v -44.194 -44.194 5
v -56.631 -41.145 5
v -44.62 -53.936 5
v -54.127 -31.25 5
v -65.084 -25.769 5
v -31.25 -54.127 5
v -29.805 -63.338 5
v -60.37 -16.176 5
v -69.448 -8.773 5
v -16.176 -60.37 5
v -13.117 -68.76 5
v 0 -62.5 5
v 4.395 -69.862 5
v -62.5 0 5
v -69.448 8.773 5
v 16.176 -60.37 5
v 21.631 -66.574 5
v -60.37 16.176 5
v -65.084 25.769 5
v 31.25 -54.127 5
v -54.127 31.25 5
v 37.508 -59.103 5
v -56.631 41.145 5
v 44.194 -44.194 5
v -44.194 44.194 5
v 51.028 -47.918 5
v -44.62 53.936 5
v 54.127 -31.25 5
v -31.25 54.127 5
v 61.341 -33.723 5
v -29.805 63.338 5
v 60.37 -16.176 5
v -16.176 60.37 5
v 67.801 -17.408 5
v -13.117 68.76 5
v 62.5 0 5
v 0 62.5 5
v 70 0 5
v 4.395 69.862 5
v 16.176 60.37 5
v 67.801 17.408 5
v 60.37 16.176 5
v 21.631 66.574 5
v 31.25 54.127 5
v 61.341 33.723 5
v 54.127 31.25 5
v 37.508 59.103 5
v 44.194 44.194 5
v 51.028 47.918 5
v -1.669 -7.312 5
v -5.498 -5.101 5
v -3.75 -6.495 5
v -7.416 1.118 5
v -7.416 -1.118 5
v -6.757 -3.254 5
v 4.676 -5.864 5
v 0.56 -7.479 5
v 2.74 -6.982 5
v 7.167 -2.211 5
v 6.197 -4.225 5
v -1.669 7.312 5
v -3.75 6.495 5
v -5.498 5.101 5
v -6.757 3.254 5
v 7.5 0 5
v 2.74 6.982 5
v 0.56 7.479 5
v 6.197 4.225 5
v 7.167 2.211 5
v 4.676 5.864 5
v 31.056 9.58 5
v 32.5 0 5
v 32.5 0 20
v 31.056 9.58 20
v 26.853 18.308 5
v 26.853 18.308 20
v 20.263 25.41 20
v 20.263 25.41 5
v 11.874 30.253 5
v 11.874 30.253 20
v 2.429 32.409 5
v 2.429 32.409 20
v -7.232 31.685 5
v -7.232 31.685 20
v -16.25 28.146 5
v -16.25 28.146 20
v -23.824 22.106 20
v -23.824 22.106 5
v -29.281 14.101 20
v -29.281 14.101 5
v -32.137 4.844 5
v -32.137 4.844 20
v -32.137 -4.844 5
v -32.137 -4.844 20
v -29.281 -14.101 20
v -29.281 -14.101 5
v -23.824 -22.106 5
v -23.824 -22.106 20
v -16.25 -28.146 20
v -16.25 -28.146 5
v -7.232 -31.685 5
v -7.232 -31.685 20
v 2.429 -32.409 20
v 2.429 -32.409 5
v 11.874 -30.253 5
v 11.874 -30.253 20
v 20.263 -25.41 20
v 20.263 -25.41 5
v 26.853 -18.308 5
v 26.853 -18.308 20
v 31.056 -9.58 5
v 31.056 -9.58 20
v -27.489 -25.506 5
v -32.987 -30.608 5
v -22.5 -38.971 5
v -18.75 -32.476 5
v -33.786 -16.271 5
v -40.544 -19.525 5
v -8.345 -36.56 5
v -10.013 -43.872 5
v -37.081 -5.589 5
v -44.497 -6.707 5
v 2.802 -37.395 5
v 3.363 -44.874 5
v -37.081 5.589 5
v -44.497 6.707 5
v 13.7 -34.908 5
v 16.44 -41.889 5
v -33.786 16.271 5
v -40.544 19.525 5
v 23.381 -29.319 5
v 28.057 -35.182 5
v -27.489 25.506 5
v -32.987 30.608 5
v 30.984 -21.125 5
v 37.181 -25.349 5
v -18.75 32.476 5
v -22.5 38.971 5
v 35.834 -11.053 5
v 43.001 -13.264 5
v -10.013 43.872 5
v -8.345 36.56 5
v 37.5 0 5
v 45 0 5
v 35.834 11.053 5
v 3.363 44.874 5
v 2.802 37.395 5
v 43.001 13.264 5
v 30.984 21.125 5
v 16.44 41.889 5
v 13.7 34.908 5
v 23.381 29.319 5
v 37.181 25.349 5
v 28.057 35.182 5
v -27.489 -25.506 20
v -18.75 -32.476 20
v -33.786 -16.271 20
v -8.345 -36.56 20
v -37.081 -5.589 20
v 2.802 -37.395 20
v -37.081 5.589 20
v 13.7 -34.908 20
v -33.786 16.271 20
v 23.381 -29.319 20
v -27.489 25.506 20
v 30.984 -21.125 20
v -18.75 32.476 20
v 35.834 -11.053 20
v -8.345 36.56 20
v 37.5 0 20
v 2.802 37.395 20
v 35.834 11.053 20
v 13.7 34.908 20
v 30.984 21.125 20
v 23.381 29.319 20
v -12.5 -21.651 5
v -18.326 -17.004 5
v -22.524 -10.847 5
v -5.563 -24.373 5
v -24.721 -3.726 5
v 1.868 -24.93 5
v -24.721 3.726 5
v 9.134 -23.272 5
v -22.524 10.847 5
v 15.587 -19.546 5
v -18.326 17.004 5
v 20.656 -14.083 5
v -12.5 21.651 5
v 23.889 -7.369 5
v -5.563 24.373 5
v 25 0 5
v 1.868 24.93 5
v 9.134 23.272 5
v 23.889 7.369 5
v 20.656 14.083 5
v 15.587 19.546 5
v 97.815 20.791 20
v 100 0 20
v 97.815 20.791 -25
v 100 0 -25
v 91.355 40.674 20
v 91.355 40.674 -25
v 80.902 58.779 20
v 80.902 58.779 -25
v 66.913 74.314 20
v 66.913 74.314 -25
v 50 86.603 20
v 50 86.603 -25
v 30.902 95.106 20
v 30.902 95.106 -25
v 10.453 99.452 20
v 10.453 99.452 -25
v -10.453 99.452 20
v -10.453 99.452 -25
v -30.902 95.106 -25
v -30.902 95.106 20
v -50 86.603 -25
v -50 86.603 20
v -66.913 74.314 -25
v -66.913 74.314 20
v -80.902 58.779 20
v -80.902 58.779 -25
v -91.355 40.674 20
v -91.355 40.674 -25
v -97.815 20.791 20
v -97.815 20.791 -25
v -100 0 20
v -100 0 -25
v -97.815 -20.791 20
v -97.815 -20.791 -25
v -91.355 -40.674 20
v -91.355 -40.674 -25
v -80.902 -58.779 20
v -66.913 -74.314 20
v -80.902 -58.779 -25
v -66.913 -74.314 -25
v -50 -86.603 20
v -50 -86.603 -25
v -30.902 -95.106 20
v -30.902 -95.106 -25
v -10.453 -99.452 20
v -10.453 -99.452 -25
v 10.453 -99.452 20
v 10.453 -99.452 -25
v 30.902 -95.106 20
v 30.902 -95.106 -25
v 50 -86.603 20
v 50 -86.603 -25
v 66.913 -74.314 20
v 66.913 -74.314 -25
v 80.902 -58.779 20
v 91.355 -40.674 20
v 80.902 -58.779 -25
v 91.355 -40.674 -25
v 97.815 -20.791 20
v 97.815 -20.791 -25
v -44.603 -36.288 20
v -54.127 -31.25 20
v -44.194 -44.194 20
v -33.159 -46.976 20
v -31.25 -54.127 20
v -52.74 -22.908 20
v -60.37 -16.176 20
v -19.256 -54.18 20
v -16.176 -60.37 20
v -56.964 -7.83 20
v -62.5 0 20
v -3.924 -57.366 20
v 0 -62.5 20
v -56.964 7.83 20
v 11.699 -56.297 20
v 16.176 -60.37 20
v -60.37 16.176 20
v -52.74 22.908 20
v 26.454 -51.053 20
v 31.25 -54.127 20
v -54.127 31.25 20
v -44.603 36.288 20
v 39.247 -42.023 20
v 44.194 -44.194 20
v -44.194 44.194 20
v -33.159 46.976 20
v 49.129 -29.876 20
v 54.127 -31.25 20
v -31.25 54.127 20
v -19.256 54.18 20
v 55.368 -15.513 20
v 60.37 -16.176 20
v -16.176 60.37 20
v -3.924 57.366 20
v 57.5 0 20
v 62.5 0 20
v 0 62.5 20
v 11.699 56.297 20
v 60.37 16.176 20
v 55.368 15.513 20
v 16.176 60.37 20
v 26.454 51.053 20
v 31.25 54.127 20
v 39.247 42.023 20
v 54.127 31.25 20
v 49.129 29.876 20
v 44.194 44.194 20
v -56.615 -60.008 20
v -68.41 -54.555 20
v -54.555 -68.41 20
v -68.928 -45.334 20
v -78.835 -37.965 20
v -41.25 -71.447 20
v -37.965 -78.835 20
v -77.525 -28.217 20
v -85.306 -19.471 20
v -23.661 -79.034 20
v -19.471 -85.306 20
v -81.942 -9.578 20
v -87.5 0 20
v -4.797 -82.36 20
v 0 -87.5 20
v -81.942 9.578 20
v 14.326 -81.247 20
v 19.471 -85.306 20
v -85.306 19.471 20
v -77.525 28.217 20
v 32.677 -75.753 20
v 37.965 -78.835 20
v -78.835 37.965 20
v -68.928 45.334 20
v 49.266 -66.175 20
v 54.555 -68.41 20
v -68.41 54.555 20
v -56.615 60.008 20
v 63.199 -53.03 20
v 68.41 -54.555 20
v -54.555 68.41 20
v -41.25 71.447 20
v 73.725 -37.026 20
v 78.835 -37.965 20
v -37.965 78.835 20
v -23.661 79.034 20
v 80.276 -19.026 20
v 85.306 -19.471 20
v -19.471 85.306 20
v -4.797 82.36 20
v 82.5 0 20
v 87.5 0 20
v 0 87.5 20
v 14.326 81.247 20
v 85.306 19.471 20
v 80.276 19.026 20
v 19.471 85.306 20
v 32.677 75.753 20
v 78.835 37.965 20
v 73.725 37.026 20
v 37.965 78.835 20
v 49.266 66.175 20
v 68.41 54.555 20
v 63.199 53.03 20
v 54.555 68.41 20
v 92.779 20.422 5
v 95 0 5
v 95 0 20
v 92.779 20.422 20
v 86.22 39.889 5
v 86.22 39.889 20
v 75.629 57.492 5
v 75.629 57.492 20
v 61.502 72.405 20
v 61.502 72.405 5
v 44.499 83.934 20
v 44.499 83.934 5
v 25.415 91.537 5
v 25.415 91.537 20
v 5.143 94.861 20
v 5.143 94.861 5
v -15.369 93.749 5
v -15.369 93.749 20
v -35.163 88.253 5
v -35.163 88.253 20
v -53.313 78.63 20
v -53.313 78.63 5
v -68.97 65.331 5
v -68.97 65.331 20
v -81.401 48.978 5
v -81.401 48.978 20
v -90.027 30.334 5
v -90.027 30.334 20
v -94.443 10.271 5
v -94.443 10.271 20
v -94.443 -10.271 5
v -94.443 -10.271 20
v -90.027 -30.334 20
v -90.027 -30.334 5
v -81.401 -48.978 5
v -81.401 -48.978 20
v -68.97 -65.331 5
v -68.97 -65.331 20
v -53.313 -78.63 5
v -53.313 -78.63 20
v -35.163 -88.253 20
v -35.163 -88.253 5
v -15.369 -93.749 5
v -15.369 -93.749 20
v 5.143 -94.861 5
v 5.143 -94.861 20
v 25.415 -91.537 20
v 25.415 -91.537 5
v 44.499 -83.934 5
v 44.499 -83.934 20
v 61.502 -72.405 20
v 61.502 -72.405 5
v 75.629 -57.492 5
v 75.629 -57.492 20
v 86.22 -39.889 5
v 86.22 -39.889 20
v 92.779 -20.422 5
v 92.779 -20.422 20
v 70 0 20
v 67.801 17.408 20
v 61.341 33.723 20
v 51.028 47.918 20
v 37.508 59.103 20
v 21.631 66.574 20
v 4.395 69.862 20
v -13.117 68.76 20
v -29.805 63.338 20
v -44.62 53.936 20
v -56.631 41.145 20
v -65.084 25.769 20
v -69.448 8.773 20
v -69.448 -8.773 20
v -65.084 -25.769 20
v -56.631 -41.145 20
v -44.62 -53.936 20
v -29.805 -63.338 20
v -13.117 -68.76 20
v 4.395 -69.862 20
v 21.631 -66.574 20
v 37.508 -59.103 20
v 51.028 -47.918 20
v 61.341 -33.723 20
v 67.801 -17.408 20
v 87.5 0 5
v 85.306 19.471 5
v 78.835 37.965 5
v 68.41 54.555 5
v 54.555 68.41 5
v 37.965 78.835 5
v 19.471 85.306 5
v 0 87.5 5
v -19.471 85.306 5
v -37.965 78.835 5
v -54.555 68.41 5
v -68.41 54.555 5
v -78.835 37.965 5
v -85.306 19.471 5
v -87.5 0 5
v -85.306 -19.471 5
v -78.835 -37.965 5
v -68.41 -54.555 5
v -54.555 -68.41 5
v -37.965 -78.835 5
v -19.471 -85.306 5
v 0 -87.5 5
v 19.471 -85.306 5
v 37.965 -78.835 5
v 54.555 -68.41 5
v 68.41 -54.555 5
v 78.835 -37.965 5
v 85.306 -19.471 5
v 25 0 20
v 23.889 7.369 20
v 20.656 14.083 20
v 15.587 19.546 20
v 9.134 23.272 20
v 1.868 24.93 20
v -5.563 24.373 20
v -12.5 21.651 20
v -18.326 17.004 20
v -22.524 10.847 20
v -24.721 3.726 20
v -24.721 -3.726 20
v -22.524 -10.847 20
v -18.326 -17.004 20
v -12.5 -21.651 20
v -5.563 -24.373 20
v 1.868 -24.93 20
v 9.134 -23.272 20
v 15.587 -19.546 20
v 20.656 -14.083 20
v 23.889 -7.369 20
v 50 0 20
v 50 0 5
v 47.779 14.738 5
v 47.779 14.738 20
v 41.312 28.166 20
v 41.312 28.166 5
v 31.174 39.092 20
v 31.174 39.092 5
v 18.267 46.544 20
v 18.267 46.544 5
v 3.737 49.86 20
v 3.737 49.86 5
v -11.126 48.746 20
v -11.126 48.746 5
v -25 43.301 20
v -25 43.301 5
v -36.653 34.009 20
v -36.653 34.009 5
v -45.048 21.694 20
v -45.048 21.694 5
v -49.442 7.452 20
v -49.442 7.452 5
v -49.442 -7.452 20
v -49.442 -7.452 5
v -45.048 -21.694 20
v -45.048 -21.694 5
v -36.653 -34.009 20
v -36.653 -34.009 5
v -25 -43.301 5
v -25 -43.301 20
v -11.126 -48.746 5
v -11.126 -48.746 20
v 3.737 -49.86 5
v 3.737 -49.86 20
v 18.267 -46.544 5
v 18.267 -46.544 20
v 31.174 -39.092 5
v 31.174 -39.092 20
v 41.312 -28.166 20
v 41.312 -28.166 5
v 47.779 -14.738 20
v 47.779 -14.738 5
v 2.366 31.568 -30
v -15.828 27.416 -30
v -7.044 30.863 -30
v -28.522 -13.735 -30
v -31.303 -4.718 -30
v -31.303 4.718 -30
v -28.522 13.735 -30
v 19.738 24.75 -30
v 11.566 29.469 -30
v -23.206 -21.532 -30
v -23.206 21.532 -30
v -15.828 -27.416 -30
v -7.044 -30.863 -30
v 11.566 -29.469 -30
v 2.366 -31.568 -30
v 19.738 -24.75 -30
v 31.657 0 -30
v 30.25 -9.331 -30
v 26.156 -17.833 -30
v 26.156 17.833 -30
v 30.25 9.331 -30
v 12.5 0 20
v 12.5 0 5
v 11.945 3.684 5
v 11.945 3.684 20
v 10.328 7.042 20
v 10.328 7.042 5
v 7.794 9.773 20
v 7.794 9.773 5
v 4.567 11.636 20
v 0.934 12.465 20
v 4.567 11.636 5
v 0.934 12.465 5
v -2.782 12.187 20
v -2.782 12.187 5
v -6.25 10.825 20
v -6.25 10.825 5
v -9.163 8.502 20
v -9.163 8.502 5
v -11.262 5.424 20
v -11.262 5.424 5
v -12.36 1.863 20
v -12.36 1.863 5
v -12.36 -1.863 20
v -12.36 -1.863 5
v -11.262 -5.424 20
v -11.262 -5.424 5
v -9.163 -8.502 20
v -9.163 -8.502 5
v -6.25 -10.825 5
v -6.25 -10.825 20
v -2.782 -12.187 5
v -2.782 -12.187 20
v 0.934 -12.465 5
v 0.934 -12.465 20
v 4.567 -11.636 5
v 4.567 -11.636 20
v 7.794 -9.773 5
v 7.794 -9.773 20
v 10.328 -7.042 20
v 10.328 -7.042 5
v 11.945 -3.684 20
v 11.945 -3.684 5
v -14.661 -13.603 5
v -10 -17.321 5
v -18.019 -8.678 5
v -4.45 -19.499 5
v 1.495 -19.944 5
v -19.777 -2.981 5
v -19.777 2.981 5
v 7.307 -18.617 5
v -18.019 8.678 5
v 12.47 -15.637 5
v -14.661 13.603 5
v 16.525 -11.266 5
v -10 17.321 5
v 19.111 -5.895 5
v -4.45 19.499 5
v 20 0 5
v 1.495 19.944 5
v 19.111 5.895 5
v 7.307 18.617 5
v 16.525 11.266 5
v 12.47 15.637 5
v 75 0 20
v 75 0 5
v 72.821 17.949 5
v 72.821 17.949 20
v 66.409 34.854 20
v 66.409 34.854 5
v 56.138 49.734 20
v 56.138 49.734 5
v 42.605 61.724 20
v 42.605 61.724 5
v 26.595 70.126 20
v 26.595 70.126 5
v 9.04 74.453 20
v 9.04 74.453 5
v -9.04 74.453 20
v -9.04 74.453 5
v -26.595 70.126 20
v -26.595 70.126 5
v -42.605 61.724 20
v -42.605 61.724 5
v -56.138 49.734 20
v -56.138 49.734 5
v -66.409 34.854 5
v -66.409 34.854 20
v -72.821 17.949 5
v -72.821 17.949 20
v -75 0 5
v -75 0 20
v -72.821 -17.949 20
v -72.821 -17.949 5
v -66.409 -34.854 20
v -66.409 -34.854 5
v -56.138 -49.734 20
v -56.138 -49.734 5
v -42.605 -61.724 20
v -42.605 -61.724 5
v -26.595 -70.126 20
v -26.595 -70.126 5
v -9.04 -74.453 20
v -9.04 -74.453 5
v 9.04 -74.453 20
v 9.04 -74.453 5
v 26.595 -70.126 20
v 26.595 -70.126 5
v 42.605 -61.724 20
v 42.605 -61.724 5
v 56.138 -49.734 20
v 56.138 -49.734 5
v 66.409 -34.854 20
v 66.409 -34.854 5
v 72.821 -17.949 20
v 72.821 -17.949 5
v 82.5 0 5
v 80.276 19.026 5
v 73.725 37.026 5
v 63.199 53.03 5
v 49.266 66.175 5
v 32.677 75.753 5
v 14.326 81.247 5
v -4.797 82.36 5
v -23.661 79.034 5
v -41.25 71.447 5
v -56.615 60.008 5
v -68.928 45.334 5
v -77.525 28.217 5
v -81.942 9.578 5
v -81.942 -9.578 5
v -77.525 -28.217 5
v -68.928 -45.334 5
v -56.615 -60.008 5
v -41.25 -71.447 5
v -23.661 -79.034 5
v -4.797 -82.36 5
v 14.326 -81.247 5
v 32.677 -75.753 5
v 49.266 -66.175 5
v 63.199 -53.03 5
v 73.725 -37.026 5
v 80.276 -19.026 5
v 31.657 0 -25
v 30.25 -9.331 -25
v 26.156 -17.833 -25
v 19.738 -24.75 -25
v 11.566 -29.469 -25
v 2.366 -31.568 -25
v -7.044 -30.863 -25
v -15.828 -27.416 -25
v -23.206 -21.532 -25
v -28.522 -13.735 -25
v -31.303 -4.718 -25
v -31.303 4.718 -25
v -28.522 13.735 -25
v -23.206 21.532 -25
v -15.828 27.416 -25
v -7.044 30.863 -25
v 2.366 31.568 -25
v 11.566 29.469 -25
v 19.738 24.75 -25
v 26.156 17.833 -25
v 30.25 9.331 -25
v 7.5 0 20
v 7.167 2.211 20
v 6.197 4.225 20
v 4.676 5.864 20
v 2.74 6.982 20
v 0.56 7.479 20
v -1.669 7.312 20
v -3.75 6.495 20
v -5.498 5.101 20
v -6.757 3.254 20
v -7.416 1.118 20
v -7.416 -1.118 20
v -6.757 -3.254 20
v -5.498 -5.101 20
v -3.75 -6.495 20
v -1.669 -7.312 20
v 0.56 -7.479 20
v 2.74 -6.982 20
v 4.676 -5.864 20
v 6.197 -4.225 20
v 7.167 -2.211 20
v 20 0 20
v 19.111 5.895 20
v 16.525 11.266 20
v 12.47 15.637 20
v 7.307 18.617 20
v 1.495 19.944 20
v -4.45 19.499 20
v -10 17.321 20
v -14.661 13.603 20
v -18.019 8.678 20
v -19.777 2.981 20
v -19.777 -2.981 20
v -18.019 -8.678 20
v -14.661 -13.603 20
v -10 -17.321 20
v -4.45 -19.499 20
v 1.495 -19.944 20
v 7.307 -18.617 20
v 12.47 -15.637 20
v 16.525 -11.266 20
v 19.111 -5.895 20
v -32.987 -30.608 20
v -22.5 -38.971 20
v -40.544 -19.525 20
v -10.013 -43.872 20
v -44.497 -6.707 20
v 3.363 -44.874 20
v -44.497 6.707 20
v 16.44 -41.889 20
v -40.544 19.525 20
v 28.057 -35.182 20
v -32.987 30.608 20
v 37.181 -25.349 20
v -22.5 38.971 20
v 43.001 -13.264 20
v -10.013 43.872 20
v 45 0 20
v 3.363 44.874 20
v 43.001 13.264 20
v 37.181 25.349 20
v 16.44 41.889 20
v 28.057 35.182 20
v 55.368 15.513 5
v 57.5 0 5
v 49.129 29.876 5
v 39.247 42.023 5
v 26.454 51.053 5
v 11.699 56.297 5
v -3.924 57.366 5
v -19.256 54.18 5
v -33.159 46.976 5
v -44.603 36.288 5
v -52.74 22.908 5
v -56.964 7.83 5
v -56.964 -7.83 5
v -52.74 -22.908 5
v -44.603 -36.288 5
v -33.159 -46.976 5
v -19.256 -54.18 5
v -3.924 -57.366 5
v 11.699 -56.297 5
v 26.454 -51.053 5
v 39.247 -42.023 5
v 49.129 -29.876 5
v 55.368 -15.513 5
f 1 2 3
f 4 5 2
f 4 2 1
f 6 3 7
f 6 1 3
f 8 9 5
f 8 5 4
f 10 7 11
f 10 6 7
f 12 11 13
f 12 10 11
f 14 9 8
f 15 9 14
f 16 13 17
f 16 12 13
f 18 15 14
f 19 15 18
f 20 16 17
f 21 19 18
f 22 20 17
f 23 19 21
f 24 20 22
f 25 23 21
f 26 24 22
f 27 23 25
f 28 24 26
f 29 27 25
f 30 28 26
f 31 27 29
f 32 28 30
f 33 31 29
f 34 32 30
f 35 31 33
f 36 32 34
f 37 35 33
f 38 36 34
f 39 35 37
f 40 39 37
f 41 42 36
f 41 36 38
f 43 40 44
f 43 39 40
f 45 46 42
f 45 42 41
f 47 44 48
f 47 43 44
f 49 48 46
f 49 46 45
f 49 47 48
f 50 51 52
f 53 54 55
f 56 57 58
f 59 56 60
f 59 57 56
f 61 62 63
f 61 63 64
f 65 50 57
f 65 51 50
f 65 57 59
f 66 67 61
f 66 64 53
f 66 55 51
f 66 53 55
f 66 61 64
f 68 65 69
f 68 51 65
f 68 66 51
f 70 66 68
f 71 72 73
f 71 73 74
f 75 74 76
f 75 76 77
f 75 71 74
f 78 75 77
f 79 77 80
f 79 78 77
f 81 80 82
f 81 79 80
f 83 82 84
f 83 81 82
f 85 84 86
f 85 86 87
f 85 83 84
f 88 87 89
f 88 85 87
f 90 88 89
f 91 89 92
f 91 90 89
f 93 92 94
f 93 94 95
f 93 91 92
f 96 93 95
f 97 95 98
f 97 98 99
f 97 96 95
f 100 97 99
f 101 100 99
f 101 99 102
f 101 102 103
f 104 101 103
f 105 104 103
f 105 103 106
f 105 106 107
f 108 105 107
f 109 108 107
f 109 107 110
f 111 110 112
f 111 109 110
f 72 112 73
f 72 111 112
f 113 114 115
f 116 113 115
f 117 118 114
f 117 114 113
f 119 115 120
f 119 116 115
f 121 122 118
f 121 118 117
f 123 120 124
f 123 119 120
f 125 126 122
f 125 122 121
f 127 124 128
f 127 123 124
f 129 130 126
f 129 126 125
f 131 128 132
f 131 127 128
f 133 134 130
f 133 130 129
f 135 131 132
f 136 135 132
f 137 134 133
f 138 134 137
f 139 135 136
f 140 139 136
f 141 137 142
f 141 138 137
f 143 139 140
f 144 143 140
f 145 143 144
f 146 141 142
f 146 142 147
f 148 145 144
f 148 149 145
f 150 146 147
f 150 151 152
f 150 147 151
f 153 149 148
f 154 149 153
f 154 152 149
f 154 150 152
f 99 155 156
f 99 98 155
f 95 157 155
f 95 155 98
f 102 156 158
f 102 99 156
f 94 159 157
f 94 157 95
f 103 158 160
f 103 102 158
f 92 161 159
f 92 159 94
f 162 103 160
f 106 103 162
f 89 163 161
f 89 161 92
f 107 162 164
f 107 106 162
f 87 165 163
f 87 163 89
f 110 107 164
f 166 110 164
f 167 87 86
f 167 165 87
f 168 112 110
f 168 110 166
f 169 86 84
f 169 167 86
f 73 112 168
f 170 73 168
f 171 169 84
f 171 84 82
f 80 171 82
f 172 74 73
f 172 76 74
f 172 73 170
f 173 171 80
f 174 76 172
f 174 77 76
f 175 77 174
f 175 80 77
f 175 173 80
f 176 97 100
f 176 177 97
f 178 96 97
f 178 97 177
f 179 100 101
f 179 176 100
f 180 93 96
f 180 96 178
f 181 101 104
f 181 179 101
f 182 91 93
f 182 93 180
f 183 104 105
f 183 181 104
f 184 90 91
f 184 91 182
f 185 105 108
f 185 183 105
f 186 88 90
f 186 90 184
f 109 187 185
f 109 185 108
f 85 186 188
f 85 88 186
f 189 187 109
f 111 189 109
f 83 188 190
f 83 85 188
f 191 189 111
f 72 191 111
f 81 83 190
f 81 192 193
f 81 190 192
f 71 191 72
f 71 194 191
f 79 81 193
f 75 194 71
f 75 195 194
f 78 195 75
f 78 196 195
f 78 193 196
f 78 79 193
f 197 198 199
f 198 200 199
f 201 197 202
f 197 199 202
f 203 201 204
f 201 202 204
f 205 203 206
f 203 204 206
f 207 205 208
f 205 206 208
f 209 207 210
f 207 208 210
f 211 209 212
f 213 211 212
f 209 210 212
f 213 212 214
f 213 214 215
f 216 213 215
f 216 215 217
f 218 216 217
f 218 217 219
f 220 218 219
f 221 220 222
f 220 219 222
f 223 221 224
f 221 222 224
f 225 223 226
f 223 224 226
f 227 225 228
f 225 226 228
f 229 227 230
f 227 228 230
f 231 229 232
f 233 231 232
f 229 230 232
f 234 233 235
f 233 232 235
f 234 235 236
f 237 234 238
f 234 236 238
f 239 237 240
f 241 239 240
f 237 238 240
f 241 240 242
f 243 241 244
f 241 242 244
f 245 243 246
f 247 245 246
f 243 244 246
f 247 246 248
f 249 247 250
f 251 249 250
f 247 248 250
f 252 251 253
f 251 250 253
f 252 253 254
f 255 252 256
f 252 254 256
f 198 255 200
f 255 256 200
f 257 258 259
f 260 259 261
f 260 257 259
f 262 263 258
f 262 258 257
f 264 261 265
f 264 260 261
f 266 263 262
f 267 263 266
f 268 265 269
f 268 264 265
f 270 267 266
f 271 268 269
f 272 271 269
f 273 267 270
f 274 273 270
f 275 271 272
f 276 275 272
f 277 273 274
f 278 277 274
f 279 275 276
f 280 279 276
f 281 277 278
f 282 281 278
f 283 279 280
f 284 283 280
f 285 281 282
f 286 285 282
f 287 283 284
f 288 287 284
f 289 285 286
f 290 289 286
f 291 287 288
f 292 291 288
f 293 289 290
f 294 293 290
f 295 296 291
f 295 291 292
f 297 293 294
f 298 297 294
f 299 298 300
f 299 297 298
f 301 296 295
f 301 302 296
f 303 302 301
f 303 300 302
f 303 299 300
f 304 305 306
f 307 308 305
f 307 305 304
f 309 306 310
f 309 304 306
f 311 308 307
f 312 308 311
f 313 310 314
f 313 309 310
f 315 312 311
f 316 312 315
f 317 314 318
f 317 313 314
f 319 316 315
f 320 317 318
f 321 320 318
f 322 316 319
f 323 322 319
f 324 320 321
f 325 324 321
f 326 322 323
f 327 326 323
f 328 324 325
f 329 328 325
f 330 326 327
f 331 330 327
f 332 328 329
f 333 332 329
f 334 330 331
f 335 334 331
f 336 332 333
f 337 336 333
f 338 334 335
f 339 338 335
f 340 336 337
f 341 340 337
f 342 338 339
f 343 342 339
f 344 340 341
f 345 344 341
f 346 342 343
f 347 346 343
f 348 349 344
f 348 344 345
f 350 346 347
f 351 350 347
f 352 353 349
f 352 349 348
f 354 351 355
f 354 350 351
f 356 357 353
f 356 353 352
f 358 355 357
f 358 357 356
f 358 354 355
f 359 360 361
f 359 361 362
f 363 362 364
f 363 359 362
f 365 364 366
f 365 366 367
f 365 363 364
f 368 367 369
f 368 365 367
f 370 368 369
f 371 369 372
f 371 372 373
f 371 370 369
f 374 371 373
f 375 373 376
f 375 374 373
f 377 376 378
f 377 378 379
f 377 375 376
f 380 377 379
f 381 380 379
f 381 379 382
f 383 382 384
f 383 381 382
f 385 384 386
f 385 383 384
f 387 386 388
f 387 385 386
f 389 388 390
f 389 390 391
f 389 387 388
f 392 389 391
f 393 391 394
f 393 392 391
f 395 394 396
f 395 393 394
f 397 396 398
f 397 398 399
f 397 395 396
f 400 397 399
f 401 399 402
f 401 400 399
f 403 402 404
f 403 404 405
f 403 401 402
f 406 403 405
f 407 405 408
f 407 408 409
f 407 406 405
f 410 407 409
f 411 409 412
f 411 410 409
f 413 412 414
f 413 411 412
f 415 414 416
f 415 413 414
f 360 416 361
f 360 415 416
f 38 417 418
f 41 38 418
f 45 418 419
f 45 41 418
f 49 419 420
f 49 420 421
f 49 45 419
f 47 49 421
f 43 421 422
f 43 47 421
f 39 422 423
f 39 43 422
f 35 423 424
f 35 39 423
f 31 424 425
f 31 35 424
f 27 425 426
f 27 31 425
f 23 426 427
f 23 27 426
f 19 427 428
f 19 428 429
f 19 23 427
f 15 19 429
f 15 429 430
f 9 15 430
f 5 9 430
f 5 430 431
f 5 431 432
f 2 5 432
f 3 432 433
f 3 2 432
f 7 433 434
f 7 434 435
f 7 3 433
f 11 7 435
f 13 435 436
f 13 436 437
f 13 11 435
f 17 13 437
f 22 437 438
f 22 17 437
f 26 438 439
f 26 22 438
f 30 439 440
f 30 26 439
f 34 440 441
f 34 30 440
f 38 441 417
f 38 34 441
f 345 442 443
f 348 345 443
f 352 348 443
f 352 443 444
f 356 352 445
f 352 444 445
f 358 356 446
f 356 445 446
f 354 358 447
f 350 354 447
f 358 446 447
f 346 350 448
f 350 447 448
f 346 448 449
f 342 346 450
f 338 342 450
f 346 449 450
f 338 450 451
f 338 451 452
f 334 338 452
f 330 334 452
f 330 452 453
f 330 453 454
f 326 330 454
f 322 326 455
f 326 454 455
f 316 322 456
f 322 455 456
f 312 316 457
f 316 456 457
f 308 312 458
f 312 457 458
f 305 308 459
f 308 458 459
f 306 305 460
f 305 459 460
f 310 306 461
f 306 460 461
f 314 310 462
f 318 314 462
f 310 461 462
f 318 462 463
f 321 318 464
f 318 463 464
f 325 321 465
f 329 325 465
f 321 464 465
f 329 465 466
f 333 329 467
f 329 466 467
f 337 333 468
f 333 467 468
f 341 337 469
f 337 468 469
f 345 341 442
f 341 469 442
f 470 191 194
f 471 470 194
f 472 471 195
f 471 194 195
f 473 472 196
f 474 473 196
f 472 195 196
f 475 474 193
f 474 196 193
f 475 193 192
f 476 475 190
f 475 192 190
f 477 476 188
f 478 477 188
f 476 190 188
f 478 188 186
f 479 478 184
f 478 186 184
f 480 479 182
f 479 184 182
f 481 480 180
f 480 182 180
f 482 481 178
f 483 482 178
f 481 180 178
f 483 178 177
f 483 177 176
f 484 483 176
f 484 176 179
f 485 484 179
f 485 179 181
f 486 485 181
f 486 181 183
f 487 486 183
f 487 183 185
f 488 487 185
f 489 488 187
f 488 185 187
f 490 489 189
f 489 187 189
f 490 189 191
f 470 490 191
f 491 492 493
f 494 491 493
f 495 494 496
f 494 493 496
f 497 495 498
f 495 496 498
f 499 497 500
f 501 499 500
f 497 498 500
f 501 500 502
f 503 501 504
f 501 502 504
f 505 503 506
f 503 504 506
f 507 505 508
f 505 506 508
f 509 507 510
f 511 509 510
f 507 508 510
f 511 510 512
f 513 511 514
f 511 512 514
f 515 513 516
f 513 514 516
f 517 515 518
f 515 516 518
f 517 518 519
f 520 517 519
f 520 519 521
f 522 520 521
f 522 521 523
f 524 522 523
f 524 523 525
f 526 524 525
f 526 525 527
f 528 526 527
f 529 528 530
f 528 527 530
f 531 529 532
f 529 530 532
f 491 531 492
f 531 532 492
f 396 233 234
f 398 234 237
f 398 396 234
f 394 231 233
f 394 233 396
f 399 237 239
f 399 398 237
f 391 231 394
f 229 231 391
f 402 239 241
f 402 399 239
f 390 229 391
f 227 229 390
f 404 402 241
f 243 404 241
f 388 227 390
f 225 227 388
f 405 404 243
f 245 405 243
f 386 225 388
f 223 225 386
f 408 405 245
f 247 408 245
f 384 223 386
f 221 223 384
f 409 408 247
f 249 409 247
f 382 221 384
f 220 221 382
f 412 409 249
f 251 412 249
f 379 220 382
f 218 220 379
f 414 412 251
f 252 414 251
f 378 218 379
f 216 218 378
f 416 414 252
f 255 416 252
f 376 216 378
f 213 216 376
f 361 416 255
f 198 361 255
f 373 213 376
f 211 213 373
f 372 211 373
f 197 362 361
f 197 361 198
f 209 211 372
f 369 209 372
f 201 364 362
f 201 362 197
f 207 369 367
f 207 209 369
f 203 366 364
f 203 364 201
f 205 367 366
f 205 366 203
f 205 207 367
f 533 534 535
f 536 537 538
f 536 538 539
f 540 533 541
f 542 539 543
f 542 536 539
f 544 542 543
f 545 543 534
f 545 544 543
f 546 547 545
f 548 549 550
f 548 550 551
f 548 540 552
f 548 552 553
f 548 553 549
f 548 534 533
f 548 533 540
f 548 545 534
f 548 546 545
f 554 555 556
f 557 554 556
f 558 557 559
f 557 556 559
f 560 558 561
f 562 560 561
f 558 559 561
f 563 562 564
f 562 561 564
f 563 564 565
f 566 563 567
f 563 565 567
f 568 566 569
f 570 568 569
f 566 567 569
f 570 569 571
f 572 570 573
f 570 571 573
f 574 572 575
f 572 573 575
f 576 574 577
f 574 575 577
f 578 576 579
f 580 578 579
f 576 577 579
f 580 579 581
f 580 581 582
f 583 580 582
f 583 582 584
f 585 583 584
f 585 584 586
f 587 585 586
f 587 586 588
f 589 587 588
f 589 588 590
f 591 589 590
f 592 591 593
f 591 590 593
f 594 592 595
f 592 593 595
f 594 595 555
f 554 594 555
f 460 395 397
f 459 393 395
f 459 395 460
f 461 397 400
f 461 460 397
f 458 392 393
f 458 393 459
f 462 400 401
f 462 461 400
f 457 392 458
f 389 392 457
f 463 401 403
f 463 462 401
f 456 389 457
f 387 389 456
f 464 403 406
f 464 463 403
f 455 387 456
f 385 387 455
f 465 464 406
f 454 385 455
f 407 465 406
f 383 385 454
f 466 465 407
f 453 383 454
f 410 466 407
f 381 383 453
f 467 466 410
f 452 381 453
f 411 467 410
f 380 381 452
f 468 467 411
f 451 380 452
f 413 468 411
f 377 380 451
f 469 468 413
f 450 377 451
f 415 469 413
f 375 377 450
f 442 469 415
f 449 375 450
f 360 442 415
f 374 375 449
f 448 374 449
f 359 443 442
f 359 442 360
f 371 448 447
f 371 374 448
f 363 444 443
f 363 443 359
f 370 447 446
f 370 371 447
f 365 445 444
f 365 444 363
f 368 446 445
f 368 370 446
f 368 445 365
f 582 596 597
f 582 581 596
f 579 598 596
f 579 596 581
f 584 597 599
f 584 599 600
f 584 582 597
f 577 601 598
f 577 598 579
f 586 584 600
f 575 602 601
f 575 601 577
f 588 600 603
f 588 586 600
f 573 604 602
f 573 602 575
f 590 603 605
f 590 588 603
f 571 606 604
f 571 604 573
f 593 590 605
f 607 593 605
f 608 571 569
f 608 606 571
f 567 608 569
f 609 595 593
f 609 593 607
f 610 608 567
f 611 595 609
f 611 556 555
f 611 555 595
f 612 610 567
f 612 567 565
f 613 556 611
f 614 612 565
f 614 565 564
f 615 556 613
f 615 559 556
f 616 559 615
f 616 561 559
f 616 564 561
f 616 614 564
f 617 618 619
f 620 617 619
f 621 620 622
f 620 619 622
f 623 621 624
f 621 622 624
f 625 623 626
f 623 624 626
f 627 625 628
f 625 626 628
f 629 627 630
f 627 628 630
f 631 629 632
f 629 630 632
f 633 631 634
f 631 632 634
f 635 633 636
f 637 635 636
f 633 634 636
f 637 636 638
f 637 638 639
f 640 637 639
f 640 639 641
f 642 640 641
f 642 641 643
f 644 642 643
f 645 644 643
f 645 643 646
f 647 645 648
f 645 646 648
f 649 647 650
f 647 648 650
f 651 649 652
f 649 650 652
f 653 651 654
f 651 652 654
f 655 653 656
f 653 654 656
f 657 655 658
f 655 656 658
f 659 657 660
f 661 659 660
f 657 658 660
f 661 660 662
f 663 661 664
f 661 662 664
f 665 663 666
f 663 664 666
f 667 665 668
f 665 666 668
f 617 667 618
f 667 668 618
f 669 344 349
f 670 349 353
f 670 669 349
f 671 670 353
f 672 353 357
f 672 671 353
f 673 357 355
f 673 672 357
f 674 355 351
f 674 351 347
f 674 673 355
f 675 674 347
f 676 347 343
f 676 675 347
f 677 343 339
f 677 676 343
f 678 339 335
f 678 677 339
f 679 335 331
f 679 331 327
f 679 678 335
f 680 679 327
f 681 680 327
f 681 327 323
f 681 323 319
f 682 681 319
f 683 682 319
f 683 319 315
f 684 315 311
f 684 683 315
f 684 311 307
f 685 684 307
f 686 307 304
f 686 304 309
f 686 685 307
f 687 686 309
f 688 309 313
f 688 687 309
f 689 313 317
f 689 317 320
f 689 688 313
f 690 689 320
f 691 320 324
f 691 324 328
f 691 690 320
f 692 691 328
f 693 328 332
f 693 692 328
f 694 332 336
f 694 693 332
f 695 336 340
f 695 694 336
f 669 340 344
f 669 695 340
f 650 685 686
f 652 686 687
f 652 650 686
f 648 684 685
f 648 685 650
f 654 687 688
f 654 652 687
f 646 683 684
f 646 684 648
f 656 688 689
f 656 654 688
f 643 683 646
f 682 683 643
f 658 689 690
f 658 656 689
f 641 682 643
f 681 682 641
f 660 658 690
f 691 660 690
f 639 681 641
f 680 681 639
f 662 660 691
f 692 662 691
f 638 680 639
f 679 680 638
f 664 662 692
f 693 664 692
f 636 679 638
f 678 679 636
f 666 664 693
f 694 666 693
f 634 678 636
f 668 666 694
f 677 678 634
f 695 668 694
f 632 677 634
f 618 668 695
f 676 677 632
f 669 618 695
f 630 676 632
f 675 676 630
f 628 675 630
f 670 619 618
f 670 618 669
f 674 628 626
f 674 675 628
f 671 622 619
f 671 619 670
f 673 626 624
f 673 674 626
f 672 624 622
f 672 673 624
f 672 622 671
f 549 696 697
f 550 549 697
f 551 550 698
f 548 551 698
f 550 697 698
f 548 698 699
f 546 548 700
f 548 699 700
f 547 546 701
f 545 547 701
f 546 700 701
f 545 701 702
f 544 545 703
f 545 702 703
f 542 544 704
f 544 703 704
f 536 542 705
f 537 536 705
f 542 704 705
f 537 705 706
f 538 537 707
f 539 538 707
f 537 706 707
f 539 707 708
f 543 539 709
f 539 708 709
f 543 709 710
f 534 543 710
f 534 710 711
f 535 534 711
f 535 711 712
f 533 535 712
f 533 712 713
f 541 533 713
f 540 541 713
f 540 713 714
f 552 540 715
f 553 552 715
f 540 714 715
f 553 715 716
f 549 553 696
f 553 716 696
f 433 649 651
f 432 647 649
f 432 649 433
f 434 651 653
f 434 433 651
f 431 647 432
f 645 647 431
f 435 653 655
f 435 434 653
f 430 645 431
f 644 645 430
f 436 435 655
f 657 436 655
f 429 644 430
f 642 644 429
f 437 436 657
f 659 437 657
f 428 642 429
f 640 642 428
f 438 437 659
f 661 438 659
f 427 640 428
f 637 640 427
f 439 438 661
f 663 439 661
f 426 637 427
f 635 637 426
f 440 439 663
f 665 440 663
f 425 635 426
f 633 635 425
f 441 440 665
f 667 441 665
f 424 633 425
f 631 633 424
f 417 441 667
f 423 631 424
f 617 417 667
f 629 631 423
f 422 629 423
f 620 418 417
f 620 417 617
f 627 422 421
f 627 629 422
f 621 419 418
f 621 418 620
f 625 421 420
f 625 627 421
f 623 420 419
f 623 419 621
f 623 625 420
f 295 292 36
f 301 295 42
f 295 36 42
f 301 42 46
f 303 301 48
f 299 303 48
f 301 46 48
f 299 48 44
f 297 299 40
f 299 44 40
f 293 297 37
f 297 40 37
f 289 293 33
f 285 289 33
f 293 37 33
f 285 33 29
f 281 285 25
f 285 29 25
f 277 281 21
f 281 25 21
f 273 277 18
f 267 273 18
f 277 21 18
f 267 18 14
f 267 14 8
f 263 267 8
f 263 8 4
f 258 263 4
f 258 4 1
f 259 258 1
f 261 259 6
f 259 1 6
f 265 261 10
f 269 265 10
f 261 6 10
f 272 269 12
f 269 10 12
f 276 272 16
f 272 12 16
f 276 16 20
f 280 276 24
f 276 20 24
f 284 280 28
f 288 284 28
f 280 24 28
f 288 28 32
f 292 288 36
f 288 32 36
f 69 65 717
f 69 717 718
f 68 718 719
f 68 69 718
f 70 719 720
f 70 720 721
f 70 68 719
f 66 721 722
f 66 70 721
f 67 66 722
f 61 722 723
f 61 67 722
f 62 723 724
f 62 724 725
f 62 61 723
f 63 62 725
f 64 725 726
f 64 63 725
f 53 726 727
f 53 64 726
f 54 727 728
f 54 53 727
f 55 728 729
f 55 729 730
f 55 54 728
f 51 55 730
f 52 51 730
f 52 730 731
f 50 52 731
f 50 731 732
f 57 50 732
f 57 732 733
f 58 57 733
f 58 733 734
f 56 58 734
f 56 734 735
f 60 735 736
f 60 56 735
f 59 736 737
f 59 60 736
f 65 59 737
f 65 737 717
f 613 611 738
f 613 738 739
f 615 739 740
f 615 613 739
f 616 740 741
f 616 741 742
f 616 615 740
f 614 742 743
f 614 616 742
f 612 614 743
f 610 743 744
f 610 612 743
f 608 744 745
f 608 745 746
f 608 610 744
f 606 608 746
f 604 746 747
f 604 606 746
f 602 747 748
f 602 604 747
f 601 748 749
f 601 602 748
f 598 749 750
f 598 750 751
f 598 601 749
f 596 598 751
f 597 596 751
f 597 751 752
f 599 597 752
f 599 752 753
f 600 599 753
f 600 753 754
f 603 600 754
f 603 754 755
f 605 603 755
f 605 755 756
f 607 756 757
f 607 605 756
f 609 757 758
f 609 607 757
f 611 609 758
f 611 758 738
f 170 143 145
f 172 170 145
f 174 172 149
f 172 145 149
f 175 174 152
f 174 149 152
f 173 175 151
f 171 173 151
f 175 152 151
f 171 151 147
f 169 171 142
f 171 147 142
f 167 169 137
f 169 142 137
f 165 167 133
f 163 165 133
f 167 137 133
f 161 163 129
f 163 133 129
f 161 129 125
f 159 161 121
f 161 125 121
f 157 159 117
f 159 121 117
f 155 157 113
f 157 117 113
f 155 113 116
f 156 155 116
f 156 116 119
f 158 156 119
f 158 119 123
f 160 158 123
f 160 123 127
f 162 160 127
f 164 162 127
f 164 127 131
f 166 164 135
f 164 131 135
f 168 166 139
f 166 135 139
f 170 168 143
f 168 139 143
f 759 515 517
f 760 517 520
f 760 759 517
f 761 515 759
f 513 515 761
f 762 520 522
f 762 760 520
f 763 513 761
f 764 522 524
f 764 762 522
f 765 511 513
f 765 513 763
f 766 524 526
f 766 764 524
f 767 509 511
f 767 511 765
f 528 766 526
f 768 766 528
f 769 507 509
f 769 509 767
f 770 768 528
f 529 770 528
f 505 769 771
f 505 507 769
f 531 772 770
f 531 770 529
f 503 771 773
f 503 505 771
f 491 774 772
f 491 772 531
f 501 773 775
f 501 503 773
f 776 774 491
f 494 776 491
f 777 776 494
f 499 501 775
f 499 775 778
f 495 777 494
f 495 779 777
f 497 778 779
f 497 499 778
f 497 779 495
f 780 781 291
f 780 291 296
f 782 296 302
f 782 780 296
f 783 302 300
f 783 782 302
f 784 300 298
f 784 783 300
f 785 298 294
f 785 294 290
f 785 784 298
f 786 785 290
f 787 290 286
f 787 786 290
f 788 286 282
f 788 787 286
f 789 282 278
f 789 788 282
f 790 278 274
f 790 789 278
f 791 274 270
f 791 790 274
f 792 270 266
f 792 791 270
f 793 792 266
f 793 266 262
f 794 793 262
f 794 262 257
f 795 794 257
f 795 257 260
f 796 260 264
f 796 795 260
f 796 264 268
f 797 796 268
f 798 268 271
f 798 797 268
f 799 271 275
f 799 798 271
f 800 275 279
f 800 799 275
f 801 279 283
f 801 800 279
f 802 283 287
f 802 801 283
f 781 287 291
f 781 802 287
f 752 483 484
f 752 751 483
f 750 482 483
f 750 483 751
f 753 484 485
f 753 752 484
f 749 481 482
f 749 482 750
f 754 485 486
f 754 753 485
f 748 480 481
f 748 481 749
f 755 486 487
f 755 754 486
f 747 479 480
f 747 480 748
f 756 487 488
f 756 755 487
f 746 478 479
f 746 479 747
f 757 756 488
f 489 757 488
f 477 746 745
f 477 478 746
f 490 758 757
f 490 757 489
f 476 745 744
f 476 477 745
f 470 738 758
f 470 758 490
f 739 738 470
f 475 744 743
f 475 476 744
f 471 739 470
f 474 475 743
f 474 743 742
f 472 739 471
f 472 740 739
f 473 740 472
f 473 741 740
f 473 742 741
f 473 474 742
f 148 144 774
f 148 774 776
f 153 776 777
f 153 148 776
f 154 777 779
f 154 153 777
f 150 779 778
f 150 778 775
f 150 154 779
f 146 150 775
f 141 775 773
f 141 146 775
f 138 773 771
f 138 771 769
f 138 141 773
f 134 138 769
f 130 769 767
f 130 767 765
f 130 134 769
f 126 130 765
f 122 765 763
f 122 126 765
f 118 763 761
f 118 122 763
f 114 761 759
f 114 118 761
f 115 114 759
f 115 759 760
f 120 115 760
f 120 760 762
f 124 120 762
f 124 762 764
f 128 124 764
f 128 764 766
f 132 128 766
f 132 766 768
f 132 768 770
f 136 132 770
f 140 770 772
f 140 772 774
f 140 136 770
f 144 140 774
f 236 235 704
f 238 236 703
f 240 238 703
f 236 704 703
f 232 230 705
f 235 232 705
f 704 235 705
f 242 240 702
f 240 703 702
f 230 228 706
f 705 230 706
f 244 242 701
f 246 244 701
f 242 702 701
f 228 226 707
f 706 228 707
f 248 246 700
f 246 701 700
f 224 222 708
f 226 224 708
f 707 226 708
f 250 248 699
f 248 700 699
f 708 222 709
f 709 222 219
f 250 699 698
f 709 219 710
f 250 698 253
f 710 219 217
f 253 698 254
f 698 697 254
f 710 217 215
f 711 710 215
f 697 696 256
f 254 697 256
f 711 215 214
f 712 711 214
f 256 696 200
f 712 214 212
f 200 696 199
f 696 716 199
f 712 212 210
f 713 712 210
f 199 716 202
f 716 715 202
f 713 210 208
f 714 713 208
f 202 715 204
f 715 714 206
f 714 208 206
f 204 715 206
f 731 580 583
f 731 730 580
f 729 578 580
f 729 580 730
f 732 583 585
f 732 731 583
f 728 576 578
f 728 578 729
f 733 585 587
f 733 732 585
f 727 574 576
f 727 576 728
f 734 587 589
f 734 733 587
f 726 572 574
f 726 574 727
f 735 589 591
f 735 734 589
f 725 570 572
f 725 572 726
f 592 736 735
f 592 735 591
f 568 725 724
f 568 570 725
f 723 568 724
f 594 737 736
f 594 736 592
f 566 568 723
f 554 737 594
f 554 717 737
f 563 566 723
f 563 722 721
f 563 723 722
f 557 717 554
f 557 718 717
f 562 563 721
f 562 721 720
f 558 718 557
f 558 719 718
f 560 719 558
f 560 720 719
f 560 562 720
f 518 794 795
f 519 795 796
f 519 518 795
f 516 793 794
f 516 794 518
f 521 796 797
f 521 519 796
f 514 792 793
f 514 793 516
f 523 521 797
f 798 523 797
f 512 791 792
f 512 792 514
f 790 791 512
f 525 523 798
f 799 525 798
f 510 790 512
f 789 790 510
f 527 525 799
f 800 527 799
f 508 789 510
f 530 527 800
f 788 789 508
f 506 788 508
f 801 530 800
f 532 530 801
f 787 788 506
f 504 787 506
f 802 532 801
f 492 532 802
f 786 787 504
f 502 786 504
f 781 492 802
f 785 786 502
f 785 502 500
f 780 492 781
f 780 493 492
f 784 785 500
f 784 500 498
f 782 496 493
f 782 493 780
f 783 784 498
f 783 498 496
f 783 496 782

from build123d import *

# Parameters (mm, degrees)
F0_R          = 100
F1_DEPTH      = 5
F1_DEPTH_BACK = 25
F2_R          = 100
F2_R_2        = 95
F2_R_3        = 87.5
F2_R_4        = 82.5
F2_R_5        = 75
F2_R_6        = 70
F2_R_7        = 62.5
F2_R_8        = 57.5
F2_R_9        = 50
F2_R_10       = 45
F2_R_11       = 37.5
F2_R_12       = 32.5
F2_R_13       = 25
F2_R_14       = 20
F2_R_15       = 12.5
F2_R_16       = 7.5
F3_DEPTH      = 15
F4_R          = 31.65685
F5_DEPTH      = 5


with BuildPart() as f1:
    # F0 (on Top) → F1 (new body, two sides)
    with BuildSketch(Plane.XY) as f1_sk:
        Circle(F0_R)
    extrude(amount=F1_DEPTH)
    extrude(f1_sk.sketch, amount=-F1_DEPTH_BACK)

    # F2 (on face) → F3 (join)
    with BuildSketch(Plane.XY.offset(5)):
        Circle(F2_R)
        Circle(F2_R_2, mode=Mode.SUBTRACT)
        Circle(F2_R_3)
        Circle(F2_R_4, mode=Mode.SUBTRACT)
        Circle(F2_R_5)
        Circle(F2_R_6, mode=Mode.SUBTRACT)
        Circle(F2_R_7)
        Circle(F2_R_8, mode=Mode.SUBTRACT)
        Circle(F2_R_9)
        Circle(F2_R_10, mode=Mode.SUBTRACT)
        Circle(F2_R_11)
        Circle(F2_R_12, mode=Mode.SUBTRACT)
        Circle(F2_R_13)
        Circle(F2_R_14, mode=Mode.SUBTRACT)
        Circle(F2_R_15)
        Circle(F2_R_16, mode=Mode.SUBTRACT)
    extrude(amount=F3_DEPTH)

    # F4 (on face) → F5 (join)
    with BuildSketch(Plane(origin=(0, 0, -25), x_dir=(1, 0, 0), z_dir=(0, 0, -1))):
        Circle(F4_R)
    extrude(amount=F5_DEPTH)


solid = f1.part
